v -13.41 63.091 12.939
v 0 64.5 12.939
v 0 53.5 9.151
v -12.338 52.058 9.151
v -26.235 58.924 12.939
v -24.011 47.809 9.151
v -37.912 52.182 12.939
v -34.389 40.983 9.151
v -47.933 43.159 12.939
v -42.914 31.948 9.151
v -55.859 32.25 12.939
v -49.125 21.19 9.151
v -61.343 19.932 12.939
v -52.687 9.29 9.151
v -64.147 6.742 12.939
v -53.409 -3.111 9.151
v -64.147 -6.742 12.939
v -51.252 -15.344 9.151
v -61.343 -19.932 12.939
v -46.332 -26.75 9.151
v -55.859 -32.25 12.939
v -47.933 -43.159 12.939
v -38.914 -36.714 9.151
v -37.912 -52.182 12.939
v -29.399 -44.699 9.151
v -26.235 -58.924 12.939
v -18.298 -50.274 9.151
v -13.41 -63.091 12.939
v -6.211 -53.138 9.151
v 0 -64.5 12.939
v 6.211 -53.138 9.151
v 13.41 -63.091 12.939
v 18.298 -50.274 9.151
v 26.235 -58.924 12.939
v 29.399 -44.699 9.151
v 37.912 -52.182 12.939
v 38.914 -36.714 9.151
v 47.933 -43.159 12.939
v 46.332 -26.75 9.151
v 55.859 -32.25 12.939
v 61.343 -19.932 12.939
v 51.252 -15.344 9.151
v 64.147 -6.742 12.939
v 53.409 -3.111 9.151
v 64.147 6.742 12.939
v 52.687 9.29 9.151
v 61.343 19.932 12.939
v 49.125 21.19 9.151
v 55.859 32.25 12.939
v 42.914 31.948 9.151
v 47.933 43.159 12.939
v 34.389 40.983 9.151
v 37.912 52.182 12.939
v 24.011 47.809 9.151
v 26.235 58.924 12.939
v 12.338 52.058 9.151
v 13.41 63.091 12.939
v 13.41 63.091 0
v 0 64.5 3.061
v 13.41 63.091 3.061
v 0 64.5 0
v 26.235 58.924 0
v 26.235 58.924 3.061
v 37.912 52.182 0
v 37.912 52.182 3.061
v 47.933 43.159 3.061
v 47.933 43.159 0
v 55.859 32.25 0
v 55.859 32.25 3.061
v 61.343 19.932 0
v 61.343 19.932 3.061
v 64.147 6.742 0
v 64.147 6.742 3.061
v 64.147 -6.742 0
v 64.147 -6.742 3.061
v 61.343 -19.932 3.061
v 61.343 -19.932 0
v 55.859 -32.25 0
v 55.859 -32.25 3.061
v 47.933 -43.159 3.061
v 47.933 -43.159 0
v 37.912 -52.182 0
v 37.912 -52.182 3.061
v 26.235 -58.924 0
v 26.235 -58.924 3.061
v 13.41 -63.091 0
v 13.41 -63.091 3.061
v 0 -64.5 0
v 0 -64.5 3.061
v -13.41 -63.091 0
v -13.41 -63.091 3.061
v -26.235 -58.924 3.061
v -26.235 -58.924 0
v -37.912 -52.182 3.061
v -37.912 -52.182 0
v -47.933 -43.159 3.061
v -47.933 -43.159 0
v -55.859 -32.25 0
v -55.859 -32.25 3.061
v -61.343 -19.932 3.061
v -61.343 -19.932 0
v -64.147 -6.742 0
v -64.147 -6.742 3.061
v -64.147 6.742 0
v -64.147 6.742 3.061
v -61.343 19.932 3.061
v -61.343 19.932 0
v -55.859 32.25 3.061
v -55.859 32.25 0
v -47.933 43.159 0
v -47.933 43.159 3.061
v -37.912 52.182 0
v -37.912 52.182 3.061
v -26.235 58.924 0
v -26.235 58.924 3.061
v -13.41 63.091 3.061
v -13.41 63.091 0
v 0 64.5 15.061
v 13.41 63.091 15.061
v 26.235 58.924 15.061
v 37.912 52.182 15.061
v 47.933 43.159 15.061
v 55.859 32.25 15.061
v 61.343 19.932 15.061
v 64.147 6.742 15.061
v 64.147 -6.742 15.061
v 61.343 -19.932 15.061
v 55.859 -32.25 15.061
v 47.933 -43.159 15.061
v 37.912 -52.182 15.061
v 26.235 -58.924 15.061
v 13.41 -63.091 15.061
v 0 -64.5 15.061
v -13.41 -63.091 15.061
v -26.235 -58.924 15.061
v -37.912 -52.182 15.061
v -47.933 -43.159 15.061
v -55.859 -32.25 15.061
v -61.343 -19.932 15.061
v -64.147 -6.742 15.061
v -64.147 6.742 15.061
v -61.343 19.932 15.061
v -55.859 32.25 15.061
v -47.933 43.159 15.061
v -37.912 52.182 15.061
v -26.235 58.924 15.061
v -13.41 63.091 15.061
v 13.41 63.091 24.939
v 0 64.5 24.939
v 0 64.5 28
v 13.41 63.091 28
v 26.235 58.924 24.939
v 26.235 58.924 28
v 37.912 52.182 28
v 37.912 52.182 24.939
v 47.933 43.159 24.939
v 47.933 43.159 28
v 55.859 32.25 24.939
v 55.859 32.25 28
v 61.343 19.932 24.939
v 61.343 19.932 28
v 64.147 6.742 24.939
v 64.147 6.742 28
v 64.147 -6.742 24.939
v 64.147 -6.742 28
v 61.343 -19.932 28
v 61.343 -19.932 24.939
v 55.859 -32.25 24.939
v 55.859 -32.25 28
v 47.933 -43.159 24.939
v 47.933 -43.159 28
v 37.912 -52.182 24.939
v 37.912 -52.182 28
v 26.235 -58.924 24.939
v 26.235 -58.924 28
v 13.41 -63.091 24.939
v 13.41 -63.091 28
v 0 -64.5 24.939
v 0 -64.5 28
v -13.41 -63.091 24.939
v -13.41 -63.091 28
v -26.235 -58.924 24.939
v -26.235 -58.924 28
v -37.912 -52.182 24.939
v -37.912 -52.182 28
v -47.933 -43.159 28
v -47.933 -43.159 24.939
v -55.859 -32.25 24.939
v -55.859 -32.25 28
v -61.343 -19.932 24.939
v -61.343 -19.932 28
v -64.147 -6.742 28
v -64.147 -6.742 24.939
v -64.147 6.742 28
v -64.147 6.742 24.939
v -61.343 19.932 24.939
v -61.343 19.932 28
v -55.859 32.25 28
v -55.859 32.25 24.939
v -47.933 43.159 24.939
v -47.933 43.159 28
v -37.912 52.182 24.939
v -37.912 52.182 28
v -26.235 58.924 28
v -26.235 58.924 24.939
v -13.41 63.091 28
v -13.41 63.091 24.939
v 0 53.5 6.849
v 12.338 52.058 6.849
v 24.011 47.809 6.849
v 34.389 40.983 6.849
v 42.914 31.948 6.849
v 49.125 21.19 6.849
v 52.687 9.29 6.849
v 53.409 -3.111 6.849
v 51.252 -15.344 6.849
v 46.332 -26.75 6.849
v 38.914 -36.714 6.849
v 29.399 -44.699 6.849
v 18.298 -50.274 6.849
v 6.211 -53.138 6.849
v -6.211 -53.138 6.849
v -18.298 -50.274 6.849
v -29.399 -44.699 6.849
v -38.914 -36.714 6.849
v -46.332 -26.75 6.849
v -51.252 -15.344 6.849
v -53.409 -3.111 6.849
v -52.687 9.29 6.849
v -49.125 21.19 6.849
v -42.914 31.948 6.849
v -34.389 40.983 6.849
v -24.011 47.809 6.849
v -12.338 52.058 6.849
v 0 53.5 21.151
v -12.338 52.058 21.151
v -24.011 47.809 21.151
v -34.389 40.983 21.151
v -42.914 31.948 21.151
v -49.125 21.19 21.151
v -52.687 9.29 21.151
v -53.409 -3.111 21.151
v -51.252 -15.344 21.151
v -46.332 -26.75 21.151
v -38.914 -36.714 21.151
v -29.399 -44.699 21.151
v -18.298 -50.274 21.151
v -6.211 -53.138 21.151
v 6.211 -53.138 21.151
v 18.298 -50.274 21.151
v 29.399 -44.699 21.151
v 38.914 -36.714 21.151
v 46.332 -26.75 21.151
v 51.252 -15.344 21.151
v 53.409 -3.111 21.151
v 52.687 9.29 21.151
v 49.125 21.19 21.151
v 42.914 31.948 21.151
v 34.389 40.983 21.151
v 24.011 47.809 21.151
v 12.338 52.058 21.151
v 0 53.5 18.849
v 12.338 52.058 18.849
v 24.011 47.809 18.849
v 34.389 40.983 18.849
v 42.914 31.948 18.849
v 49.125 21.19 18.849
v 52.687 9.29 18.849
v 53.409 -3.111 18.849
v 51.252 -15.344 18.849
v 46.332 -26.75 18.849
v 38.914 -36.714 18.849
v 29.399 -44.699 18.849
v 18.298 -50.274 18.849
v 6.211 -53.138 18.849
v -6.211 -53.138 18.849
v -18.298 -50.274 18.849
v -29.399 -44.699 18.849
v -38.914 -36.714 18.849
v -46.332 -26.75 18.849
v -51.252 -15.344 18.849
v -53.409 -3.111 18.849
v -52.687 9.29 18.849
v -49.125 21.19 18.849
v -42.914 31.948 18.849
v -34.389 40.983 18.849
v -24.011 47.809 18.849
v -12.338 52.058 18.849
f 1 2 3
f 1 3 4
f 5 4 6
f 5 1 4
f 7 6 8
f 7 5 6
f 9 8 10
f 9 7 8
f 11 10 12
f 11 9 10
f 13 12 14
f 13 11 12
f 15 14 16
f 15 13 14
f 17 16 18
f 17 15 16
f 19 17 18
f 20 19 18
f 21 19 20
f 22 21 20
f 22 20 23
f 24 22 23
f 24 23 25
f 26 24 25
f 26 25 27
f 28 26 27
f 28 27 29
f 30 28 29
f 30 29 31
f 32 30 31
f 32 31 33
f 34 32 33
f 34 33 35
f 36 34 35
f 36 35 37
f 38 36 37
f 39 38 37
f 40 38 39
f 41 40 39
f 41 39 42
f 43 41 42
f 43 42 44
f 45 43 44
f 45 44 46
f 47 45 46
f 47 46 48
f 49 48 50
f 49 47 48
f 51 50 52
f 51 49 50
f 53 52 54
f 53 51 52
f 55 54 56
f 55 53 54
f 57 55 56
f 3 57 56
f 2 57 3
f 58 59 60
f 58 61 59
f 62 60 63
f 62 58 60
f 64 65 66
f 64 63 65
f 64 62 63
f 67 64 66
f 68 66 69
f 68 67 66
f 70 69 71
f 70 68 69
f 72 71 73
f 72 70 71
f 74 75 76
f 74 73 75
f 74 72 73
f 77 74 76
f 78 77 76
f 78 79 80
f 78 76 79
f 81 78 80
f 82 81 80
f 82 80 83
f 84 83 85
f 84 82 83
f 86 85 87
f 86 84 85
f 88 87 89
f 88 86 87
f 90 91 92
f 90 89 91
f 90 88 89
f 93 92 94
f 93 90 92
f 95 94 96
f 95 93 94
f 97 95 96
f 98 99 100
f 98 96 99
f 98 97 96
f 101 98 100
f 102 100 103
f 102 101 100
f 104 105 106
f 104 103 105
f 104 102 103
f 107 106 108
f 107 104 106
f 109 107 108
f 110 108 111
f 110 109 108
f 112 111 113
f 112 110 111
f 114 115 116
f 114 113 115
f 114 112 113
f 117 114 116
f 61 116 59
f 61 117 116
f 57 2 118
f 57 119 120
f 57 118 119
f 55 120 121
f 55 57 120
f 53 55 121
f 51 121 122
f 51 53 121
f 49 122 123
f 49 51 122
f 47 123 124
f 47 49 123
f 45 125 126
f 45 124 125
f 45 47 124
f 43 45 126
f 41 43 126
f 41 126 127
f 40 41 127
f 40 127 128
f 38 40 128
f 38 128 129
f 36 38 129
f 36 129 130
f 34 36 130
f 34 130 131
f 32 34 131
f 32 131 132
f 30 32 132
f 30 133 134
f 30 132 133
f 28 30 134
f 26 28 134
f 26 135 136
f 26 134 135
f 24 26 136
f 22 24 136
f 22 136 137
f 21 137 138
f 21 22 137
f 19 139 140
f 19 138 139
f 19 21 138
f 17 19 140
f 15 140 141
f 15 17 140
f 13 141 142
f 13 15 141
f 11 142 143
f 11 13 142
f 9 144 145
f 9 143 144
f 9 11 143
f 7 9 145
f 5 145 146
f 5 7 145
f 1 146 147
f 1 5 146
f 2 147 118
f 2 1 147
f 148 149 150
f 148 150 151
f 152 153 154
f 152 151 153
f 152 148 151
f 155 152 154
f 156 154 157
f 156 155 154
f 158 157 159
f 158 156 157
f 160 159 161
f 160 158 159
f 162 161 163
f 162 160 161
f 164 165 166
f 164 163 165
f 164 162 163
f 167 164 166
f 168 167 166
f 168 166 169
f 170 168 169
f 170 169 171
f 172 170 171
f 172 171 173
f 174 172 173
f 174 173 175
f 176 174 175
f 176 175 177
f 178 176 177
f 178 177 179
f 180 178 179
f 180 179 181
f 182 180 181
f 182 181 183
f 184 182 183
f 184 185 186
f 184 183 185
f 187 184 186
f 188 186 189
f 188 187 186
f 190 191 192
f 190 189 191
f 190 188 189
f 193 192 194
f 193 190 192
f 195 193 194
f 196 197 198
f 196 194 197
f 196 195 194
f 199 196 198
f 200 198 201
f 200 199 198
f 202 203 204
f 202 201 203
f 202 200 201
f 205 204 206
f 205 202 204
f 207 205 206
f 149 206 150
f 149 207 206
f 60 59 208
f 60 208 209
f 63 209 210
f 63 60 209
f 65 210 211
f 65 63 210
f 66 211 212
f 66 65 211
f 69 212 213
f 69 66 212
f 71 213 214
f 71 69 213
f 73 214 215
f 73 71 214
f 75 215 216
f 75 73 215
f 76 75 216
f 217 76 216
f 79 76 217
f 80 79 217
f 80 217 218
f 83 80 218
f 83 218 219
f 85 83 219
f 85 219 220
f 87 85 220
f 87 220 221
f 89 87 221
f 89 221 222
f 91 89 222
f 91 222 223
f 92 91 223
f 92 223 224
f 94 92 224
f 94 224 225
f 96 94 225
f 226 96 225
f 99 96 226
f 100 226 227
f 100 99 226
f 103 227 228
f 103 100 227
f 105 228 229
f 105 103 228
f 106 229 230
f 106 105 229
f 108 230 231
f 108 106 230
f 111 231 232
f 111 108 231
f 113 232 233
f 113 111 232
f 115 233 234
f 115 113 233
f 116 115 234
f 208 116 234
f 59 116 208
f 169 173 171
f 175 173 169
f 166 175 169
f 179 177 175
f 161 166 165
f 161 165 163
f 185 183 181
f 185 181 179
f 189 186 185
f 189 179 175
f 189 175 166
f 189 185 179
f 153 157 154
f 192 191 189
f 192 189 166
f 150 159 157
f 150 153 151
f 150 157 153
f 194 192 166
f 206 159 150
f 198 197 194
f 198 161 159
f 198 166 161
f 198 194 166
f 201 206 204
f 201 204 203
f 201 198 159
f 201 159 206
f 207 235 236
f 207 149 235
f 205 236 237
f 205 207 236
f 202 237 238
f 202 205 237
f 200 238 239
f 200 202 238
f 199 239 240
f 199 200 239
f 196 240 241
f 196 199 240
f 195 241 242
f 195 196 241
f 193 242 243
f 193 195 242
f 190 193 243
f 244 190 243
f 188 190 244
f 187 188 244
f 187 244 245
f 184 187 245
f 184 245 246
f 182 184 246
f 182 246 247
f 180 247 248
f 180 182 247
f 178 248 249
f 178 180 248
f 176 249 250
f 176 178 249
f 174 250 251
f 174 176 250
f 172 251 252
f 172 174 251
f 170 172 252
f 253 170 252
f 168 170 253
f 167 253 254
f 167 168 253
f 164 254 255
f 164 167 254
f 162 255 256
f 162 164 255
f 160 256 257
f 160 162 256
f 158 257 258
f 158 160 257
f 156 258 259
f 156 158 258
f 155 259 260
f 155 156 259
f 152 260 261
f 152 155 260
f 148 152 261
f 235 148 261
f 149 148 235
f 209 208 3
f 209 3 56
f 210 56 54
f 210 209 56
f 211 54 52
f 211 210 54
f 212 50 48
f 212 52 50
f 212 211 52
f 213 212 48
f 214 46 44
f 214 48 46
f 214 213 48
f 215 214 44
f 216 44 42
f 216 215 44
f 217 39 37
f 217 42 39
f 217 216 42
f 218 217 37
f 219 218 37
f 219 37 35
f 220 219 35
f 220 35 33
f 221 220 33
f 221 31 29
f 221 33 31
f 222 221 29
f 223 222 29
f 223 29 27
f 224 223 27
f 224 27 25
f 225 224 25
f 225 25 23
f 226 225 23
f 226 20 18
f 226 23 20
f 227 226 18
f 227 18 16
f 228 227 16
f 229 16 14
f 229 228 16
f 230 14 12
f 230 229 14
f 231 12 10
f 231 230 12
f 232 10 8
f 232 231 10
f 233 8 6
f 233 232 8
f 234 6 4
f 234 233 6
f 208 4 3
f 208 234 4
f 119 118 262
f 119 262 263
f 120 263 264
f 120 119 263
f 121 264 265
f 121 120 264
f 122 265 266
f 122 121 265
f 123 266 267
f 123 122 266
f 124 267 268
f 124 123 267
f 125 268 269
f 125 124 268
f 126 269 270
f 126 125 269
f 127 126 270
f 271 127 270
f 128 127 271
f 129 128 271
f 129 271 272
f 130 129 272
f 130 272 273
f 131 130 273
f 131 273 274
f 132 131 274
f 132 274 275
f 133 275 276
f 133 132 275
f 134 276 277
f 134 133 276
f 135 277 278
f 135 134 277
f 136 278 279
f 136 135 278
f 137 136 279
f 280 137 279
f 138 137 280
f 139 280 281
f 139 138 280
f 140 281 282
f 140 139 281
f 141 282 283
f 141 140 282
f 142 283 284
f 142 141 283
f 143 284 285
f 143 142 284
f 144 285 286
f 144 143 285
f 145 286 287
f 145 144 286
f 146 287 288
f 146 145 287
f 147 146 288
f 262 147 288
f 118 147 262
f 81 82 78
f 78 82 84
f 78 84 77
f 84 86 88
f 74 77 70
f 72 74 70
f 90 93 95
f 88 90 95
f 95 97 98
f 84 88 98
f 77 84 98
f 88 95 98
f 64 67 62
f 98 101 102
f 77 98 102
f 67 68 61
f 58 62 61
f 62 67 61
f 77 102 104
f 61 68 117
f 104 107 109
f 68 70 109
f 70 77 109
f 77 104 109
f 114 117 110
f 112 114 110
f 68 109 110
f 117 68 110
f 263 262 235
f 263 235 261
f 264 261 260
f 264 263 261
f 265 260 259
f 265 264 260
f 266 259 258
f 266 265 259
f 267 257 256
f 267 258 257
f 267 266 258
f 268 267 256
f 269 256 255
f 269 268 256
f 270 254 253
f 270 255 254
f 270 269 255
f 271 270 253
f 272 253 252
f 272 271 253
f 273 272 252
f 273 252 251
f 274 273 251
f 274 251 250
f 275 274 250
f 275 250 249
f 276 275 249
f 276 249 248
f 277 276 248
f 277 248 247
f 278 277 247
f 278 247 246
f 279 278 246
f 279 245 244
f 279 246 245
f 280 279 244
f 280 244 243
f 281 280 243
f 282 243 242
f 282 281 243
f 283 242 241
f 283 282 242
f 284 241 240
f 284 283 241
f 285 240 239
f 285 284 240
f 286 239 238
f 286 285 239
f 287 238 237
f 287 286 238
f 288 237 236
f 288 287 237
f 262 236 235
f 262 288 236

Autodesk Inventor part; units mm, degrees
ref_plane "YZ Plane" through (0, 0, 0) normal (1, 0, 0) x (0, 1, 0)
ref_plane "XZ Plane" through (0, 0, 0) normal (0, 1, 0) x (-1, 0, 0)
sketch "Main Sketch" plane through (0, 0, 0) normal (1, 0, 0) x (0, 1, 0)
  line L0 (0, 28) -> (64.5, 28)
  line L1 (64.5, 28) -> (64.5, 12.9387)
  line L2 (64.5, 12.9387) -> (53.5, 9.1511)
  line L3 (53.5, 9.1511) -> (53.5, 6.8489)
  line L4 (53.5, 6.8489) -> (64.5, 3.0613)
  line L5 (64.5, 3.0613) -> (64.5, 0)
  line L6 (64.5, 0) -> (0, 0)
  line L7 (62.5, 12.25) -> (62.5, 3.75) construction
  line L8 (53.5, 8) -> (62.5, 8) construction
  line L9 (64.5, 12.9387) -> (64.5, 3.0613)
  line L10 (0, -4) -> (0, 24) projected
  line L11 (0, 0) -> (0, 28)
  dimension "d0" = 8.5
  dimension "d1" = 38
  dimension "d2" = 2
  dimension "d6" = 28
  dimension "d21" = 125
  dimension "d25" = 11
  dimension "d27" = 8
ref_plane "Belt Plane" through (0, 53.5, 8) normal (0, 0, 1) x (1, 0, 0)
revolve "Body" add sketch "Main Sketch" angle 360 about axis through (0, 0, -10) along (0, 0, 1)
revolve "Groove" cut sketch "Main Sketch" angle 360 about axis through (0, 0, -10) along (0, 0, 1) contours L9 L4 L3 L2
fillet "Fillet External" [suppressed]
fillet "Fillet Internal" [suppressed]
pattern_linear "Groove Pattern" count 2 spacing 12 along (0, 0, 1) of "Groove"
equation "\"d0\" = da_Bw"
equation "\"d1\" = da_Alfa"
equation "\"d2\" = da_c"
equation "\"d21\" = da_Dw"
equation "\"d25\" = da_Hd"
equation "\"d27\" = da_Se"
equation "\"da_r1\" = 0"
equation "\"da_r2\" = 0"
equation "\"d18\" = da_Sg"
equation "\"d5\" = da_Se"
equation "\"da_Bw\" = 8.5"
equation "\"da_Alfa\" = 38deg"
equation "\"da_c\" = 2"
equation "\"da_Dw\" = 125"
equation "\"da_Hd\" = 11"
equation "\"da_Se\" = 8"
equation "\"da_Sg\" = 12"
properties part number "Grooved Pulley1" material "Steel"
